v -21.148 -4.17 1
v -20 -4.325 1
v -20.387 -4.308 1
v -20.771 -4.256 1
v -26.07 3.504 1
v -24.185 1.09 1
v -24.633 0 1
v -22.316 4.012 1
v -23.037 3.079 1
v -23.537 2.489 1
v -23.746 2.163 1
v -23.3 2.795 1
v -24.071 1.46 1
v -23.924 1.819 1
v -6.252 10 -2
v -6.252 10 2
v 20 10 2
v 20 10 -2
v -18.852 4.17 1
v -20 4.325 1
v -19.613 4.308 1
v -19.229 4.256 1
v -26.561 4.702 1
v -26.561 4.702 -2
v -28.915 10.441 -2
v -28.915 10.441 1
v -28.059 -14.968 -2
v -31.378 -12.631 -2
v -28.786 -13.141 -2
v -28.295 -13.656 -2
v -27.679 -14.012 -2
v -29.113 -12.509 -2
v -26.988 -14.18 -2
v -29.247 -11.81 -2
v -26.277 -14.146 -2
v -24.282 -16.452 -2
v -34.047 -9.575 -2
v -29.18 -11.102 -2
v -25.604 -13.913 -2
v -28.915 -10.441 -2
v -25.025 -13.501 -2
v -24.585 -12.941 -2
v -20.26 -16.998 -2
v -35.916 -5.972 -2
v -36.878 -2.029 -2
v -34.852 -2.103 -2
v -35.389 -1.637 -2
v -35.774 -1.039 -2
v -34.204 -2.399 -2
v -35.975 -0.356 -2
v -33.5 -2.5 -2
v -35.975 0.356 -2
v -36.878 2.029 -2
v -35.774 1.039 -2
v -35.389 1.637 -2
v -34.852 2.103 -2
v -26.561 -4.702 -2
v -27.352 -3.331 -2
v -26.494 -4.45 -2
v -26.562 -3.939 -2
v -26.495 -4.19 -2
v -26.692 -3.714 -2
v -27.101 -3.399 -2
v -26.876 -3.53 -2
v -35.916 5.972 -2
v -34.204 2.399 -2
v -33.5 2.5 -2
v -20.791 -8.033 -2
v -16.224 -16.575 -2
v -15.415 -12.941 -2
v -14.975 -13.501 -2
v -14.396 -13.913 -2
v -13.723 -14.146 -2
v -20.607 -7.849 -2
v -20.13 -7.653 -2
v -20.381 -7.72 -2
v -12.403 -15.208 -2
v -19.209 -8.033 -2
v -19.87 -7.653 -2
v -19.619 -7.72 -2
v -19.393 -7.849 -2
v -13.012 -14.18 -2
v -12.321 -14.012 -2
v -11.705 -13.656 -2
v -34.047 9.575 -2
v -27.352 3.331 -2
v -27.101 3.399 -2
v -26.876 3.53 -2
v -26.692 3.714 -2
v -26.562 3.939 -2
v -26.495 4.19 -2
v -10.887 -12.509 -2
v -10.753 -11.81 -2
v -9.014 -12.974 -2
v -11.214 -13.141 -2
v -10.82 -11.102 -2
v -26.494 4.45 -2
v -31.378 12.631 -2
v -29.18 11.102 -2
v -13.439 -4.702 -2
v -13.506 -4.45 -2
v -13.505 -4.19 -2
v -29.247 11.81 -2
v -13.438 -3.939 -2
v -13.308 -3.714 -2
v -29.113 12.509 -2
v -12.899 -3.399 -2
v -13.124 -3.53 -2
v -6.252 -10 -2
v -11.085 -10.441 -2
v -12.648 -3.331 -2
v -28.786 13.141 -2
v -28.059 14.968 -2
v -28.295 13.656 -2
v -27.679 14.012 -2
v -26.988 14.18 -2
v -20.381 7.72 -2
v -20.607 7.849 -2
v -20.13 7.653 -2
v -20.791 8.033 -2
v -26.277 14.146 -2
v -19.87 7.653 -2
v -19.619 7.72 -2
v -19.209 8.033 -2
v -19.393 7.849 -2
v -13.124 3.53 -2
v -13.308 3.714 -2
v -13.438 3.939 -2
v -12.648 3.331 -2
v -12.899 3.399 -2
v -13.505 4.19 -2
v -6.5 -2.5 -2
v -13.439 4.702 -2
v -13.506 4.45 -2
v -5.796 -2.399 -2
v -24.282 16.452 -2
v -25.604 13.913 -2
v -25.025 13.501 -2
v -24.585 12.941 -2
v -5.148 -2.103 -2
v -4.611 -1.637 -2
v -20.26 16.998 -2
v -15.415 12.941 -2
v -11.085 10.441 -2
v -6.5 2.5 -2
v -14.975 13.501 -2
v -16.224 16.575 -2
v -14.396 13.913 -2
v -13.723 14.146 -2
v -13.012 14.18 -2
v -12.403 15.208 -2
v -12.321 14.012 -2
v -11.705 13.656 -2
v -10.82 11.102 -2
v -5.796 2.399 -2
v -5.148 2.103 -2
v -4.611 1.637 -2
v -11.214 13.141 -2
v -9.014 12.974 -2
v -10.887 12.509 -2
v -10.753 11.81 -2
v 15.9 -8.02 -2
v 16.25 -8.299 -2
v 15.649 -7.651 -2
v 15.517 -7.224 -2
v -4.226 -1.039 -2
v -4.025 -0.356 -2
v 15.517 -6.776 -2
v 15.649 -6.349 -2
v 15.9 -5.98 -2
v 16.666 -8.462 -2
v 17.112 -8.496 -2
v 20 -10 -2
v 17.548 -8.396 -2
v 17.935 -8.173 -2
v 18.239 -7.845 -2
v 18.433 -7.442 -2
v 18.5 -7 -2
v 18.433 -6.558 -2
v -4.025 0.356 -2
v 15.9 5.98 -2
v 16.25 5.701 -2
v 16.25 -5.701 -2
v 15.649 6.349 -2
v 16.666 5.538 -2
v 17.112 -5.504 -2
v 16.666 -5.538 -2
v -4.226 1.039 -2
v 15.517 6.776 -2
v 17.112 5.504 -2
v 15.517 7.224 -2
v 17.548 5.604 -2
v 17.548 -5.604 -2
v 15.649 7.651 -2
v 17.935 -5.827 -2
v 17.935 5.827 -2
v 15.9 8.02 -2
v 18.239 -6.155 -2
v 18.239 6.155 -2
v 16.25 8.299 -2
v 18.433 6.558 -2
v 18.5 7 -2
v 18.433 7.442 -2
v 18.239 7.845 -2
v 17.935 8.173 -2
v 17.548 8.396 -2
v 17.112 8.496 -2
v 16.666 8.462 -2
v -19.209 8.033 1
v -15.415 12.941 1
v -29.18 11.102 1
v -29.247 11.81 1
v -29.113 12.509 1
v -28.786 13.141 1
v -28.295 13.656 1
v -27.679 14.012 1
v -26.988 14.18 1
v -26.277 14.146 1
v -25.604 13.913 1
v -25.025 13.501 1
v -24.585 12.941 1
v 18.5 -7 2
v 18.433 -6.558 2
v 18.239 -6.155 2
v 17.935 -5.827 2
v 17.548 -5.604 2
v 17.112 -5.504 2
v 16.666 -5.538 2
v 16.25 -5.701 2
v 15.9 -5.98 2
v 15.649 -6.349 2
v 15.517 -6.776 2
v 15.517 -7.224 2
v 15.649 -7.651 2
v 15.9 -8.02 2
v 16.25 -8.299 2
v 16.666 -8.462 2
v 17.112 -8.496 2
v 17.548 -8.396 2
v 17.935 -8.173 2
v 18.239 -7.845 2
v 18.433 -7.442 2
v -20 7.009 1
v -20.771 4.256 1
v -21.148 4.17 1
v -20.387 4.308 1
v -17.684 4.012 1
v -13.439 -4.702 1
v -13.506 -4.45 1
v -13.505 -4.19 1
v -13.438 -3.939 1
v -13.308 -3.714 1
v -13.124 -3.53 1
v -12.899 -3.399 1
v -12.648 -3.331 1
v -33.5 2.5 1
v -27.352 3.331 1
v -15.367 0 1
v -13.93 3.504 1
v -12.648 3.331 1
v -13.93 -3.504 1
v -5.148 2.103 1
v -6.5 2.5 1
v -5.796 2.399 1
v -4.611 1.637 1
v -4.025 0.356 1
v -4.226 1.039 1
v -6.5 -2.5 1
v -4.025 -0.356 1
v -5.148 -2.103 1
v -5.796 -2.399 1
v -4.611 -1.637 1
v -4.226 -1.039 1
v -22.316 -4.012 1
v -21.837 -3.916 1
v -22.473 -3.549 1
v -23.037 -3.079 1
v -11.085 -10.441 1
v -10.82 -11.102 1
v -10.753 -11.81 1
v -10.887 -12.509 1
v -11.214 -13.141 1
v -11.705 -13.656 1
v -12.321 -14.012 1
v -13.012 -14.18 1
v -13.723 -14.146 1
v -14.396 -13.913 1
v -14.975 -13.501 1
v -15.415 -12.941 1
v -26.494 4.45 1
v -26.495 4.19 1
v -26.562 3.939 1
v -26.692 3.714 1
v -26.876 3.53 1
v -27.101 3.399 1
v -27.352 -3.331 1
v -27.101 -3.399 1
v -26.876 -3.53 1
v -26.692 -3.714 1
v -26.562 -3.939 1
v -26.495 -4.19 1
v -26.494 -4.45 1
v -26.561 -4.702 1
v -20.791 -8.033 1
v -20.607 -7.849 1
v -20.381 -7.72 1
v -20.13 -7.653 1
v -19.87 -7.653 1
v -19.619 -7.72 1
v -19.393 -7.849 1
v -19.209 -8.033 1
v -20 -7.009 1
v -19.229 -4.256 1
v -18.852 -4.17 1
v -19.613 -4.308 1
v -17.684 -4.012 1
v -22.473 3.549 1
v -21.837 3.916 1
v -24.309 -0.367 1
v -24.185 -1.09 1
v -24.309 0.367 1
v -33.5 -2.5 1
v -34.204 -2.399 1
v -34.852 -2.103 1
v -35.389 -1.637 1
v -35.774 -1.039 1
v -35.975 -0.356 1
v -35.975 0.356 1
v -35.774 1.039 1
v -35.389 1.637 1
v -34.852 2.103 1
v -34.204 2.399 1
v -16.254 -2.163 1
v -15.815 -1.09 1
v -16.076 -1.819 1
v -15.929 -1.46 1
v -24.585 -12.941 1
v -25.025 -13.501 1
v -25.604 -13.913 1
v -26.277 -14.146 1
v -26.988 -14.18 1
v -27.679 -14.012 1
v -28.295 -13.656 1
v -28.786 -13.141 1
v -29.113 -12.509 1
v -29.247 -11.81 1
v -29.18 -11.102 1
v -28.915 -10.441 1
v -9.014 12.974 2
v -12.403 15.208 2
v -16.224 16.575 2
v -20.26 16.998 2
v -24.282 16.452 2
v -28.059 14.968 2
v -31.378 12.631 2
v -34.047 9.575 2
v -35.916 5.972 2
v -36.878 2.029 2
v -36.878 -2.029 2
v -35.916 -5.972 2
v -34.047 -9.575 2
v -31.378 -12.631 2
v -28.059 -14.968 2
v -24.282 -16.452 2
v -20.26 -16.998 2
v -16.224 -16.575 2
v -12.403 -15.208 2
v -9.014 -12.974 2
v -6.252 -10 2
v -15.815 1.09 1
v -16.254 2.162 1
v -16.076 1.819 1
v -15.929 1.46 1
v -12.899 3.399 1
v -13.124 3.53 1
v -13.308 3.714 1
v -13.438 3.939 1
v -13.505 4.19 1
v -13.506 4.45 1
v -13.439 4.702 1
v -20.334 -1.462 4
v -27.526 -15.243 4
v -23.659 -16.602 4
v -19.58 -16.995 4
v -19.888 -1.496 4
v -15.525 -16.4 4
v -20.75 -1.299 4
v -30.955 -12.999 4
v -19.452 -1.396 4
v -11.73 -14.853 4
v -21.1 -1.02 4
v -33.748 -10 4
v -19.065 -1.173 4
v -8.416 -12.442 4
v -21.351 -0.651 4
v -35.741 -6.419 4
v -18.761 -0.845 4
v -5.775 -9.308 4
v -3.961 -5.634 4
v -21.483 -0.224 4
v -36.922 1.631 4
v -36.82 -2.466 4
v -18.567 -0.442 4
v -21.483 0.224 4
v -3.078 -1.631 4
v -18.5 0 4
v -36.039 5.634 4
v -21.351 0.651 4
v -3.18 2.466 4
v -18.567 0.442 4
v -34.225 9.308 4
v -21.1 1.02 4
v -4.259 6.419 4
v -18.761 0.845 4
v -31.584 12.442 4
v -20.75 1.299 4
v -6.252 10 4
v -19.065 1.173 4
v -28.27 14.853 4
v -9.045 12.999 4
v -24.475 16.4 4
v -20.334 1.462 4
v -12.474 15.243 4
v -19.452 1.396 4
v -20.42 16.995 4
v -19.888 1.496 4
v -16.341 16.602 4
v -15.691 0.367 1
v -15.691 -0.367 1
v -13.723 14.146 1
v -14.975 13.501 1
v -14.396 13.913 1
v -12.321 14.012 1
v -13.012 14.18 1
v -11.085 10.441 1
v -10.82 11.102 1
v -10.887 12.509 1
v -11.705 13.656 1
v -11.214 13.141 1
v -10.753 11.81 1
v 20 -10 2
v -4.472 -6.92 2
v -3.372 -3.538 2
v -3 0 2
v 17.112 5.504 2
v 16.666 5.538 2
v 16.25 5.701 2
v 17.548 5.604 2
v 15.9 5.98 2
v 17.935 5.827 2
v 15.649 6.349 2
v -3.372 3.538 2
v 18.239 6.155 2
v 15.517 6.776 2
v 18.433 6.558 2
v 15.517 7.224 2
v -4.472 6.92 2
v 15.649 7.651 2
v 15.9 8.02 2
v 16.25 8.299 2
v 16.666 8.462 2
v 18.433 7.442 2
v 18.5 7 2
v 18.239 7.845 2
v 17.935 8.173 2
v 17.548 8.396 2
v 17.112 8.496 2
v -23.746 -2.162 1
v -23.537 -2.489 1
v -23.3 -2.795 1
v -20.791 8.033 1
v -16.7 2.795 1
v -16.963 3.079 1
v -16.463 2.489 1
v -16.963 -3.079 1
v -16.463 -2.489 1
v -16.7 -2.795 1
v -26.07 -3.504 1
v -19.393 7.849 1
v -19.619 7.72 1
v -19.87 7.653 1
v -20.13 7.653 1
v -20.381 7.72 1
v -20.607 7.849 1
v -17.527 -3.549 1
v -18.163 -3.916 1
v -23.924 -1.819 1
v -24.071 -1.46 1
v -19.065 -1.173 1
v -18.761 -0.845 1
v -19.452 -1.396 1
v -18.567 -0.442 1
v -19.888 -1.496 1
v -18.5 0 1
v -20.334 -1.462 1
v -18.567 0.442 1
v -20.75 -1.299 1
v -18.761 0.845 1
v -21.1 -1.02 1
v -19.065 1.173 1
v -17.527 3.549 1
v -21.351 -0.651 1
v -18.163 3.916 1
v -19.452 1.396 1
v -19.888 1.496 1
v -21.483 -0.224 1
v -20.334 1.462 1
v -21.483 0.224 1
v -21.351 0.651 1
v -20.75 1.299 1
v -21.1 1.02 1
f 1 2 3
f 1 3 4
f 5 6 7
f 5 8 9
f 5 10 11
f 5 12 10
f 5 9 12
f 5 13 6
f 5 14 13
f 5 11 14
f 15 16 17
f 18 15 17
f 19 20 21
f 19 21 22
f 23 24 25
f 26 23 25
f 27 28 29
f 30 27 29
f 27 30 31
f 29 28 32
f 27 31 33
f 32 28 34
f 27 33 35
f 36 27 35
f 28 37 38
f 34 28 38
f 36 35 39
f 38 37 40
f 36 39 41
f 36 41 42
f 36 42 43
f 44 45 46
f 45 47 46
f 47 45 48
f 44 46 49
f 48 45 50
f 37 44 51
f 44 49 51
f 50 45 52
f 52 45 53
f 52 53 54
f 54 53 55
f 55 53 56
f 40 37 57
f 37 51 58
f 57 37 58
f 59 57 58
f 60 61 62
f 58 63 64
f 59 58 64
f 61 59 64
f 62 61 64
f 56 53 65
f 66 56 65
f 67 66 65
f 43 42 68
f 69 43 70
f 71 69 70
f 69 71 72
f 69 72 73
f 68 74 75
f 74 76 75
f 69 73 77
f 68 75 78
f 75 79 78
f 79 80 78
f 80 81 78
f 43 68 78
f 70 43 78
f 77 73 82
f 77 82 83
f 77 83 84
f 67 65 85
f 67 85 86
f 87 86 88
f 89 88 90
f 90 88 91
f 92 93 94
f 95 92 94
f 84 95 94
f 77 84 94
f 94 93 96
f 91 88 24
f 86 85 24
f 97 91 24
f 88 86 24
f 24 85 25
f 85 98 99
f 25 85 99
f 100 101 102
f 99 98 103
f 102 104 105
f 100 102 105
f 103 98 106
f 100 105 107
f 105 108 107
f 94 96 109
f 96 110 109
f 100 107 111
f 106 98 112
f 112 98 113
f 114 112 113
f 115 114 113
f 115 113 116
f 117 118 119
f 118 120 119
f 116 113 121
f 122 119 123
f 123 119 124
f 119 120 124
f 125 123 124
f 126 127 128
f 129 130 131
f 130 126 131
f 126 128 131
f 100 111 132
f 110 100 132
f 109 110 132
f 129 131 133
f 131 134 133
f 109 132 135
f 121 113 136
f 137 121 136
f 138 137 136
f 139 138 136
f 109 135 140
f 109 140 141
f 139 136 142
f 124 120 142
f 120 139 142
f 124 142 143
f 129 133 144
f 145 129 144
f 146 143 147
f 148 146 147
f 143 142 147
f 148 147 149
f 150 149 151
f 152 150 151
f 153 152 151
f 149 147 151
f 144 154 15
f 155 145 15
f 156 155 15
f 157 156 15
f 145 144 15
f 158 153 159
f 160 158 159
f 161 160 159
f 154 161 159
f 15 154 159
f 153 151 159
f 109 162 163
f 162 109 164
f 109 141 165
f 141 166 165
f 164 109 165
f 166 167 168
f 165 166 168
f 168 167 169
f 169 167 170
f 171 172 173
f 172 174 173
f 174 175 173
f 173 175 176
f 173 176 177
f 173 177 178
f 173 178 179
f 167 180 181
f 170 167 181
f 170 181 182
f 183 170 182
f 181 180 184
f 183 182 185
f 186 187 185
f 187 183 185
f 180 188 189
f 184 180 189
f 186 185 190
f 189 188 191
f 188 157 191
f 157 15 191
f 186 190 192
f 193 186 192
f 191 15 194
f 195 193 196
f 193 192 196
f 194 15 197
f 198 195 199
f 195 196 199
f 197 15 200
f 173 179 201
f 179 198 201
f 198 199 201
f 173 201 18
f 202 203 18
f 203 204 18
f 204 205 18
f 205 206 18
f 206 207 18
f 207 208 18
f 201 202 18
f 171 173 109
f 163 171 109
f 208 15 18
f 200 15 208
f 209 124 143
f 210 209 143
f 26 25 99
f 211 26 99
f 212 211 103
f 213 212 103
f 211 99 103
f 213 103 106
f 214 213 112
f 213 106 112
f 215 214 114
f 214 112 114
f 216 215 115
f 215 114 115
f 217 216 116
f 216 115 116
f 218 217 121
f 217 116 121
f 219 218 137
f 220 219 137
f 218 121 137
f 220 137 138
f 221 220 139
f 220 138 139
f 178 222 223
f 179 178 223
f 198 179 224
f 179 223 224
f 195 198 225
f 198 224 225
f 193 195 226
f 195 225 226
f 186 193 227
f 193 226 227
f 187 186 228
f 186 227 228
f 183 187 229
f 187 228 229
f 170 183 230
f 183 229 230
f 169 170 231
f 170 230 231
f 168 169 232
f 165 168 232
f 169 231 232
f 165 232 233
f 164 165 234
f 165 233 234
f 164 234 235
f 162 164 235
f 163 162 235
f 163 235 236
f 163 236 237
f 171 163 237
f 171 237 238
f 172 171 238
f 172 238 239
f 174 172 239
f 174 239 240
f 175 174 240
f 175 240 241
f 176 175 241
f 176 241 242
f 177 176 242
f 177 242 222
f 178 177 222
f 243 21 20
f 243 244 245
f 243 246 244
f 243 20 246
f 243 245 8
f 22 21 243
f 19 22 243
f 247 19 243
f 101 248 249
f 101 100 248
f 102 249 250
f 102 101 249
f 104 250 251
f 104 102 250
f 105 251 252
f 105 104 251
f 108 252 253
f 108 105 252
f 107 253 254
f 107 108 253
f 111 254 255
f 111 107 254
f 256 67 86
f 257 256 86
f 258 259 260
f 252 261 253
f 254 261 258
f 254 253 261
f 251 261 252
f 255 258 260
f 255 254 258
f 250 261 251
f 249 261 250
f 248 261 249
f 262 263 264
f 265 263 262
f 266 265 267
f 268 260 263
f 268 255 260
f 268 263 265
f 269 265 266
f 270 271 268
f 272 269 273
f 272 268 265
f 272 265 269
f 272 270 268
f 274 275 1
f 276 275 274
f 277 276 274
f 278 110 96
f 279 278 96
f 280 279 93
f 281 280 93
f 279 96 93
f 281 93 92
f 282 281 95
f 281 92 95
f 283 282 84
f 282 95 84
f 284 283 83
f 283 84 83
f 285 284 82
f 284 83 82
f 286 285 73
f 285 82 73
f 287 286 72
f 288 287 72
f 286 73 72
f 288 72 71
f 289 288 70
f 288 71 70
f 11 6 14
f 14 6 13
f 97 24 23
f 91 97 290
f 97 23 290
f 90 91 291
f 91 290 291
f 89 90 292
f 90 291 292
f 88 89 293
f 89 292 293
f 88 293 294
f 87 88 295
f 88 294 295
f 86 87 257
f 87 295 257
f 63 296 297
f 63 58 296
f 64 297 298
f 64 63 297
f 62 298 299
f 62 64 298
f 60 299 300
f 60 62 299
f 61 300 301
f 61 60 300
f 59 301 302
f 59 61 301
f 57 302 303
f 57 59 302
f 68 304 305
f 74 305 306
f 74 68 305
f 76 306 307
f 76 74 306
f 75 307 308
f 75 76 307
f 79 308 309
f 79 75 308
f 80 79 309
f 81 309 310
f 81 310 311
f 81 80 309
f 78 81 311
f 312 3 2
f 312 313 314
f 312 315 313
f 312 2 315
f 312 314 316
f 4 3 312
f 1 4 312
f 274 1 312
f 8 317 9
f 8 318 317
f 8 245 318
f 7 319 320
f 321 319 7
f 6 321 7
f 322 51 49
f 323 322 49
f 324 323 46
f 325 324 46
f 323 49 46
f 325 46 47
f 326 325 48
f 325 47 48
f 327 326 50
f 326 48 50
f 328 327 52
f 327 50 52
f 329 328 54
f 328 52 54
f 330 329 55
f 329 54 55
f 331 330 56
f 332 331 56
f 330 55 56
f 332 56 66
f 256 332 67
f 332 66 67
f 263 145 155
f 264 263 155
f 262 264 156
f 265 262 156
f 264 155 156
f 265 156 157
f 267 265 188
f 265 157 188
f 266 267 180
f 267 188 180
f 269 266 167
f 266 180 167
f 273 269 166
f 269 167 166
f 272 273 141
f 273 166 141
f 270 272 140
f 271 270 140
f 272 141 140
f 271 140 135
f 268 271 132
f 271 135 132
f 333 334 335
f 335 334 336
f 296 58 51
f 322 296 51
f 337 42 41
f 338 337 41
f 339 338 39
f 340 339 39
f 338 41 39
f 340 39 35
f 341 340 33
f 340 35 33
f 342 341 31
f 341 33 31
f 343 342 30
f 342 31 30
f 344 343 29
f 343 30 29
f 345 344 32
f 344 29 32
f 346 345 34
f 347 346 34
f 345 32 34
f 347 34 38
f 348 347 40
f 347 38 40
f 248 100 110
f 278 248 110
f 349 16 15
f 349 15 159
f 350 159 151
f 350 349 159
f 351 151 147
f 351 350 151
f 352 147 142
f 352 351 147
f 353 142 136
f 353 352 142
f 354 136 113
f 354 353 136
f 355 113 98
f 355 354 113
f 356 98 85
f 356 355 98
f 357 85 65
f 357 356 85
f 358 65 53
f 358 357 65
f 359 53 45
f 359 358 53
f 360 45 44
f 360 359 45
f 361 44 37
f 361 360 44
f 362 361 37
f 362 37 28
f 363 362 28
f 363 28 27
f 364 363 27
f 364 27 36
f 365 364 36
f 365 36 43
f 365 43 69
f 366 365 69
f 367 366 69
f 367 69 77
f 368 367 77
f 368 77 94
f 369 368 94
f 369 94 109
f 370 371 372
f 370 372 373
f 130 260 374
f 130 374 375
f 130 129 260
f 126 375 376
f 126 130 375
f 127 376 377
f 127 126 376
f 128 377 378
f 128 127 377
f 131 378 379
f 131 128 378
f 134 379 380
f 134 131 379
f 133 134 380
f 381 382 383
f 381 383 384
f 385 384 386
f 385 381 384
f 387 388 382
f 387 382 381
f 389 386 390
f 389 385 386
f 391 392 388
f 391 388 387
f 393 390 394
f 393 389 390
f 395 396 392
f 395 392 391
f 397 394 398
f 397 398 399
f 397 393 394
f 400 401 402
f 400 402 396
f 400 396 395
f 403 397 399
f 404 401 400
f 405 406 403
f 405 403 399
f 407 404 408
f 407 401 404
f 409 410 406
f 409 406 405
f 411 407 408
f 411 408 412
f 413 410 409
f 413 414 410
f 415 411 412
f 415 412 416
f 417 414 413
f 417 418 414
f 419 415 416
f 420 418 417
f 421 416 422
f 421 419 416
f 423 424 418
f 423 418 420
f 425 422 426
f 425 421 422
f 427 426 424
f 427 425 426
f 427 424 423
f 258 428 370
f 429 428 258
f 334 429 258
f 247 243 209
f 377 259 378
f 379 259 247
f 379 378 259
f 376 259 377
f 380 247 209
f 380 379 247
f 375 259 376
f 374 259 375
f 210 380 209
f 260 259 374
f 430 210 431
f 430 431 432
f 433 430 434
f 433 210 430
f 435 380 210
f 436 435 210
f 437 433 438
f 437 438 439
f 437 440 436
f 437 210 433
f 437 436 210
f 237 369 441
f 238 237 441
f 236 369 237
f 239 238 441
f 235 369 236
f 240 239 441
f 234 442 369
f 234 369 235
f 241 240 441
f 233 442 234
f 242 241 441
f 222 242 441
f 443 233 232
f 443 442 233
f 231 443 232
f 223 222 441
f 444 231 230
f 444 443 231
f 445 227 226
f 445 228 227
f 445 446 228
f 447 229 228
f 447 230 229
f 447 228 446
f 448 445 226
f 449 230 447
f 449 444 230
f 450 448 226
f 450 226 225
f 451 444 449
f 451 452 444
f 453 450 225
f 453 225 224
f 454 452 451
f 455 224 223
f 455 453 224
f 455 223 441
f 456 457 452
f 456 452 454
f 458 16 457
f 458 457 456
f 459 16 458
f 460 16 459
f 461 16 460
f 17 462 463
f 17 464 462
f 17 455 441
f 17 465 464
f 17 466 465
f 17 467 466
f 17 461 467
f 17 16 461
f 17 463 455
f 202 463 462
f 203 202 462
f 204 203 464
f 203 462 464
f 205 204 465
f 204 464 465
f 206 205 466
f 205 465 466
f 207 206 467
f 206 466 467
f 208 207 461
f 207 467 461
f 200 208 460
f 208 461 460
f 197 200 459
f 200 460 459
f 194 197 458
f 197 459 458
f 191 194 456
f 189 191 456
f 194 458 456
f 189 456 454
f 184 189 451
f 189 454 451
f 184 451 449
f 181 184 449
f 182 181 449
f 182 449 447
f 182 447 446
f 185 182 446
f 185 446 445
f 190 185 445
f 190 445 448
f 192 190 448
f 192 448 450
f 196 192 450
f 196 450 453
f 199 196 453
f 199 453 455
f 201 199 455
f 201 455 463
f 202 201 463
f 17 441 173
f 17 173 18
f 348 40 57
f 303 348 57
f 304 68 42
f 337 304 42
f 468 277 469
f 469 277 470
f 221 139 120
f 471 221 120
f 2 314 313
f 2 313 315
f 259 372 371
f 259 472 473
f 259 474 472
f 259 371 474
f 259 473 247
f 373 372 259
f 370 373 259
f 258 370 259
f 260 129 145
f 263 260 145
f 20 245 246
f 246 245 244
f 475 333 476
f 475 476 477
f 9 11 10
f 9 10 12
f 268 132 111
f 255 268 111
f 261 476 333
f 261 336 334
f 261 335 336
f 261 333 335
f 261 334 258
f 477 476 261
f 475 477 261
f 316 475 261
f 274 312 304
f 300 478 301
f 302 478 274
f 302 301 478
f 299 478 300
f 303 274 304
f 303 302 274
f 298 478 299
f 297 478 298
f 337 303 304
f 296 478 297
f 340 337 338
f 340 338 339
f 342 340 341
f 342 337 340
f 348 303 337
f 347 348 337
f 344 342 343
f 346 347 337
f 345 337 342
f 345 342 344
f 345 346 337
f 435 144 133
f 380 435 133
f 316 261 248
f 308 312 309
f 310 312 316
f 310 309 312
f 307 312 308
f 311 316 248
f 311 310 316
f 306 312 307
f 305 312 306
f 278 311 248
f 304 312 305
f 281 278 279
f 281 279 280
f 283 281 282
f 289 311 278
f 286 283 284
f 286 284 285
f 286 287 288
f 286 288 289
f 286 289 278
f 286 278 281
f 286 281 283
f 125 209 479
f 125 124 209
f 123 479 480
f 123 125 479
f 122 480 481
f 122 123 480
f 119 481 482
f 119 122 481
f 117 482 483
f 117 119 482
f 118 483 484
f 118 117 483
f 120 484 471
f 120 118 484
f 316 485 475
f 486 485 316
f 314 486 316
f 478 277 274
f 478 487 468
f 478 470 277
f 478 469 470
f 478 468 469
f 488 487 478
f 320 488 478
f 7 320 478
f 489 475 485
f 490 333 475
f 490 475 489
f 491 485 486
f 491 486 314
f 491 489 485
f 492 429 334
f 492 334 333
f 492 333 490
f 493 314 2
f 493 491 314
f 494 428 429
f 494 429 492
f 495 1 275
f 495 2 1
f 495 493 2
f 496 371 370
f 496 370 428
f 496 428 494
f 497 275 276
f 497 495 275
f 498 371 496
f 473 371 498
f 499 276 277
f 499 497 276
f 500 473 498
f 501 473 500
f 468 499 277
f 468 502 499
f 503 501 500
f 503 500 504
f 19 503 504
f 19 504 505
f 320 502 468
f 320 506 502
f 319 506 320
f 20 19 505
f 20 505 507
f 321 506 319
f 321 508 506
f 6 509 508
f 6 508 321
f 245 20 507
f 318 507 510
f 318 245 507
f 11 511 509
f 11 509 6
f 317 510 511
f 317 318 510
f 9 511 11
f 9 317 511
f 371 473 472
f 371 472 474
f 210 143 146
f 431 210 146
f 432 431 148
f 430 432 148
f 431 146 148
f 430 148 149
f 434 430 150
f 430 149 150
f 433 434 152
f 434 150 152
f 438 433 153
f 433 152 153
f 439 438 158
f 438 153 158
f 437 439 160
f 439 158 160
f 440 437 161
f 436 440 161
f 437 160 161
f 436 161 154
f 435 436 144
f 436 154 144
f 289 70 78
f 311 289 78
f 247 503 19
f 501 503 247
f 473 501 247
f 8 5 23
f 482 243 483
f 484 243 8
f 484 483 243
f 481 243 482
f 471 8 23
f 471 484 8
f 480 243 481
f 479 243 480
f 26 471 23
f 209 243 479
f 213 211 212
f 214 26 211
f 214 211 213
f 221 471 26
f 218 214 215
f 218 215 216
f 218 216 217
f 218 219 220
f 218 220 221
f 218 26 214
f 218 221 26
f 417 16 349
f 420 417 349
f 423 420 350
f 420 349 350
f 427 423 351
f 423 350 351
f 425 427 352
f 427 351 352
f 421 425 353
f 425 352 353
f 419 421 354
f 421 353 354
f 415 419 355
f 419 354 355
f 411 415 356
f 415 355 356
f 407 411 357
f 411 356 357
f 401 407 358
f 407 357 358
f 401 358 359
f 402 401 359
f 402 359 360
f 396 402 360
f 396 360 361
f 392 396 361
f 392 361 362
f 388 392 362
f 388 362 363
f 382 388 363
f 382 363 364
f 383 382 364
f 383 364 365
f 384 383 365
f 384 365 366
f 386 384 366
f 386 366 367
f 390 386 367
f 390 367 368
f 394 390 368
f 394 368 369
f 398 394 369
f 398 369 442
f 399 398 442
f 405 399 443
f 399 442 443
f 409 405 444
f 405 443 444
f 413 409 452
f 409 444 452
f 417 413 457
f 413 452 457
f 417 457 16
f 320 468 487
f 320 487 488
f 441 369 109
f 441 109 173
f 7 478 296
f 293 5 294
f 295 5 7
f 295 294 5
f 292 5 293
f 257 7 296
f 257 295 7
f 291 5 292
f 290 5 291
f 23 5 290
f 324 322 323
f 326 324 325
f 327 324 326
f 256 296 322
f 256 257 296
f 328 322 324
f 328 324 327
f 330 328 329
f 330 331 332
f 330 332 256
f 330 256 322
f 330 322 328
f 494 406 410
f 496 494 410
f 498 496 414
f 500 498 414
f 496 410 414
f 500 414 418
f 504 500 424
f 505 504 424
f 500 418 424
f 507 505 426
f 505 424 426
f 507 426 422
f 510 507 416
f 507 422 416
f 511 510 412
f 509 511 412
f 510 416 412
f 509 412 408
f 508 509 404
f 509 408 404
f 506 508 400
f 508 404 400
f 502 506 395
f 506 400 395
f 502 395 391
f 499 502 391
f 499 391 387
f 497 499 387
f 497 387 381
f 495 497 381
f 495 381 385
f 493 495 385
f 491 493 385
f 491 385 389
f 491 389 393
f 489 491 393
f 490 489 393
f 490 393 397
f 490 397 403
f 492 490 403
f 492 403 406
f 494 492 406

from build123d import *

# Parameters (mm, degrees)
SKETCH1_W                       = 40
SKETCH1_H                       = 20
BOSS_EXTRUDE1_DEPTH             = 2
BOSS_EXTRUDE2_REACH             = 24.716
SKETCH6_R                       = 17
BOSS_EXTRUDE2_DIRECTION_2_DEPTH = 2
SKETCH7_R                       = 2.5
CUT_EXTRUDE3_DEPTH              = 3
CIRPATTERN1_COUNT               = 6
FILLET3_R                       = 1
CUT_EXTRUDE4_REACH              = 43.158
SKETCH8_R                       = 1.5
CUT_EXTRUDE5_REACH              = 42.915
SKETCH9_R                       = 1.5


with BuildPart() as part:
    # Sketch1 → Boss-Extrude1 (new, symmetric)
    with BuildSketch(Plane.XY):
        Rectangle(SKETCH1_W, SKETCH1_H)
    extrude(amount=BOSS_EXTRUDE1_DEPTH, both=True)

    # Boss-Extrude2: up to this face of the body (flat: up to its plane)
    boss_extrude2_end = Plane(part.part.faces().sort_by_distance((0, 0, -2))[0])
    # Sketch6 → Boss-Extrude2 (add, up to the picked face)
    with BuildSketch(Plane.XY.offset(2), mode=Mode.PRIVATE) as boss_extrude2_sk1:
        with Locations(Location((-20, 0, 0), (0, 0, 36.031879072))):
            Circle(SKETCH6_R)
    boss_extrude2_tool1 = split(extrude(boss_extrude2_sk1.sketch, amount=-BOSS_EXTRUDE2_REACH, mode=Mode.PRIVATE), bisect_by=boss_extrude2_end, keep=Keep.BOTH, mode=Mode.PRIVATE)
    add(boss_extrude2_tool1.solids().sort_by(Axis((-20, 0, 2), (0, 0, -1)))[0])

    # Sketch6 → Boss-Extrude2 direction 2 (add)
    with BuildSketch(Plane.XY.offset(2)):
        with Locations(Location((-20, 0, 0), (0, 0, 36.031879072))):
            Circle(SKETCH6_R)
    extrude(amount=BOSS_EXTRUDE2_DIRECTION_2_DEPTH)

    # Sketch7 → Cut-Extrude3 (cut)
    with BuildSketch(Plane(origin=(0, 0, -2), x_dir=(-1, 0, 0), z_dir=(0, 0, -1))):
        with BuildLine():
            Line((21.148365434, 4.169758006), (20, 4.325))
            ThreePointArc((20, 4.325), (15.675, 0), (20, -4.325))
            Line((20, -4.325), (21.148365434, -4.169758006))
            ThreePointArc((21.148365434, -4.169758006), (23.440371019, -2.620967808), (24.325, 0))
            ThreePointArc((24.325, 0), (23.440371019, 2.620967808), (21.148365434, 4.169758006))
        make_face()
        with BuildLine():
            Line((33.5, 2.5), (21.148365434, 4.169758006))
            ThreePointArc((21.148365434, 4.169758006), (23.440371019, 2.620967808), (24.325, 0))
            ThreePointArc((24.325, 0), (23.440371019, -2.620967808), (21.148365434, -4.169758006))
            Line((21.148365434, -4.169758006), (33.5, -2.5))
            ThreePointArc((33.5, -2.5), (31, 0), (33.5, 2.5))
        make_face()
        with Locations((33.5, 0)):
            Circle(SKETCH7_R)
    cut_extrude3 = extrude(amount=-CUT_EXTRUDE3_DEPTH, mode=Mode.SUBTRACT)

    # CirPattern1: Cut-Extrude3 ×6 about axis
    cirpattern1_axis = Axis((-20, 0, 0), (0, 0, 1))
    for i in range(1, CIRPATTERN1_COUNT):
        add(cut_extrude3.rotate(cirpattern1_axis, i * 360 / CIRPATTERN1_COUNT), mode=Mode.SUBTRACT)

    # Fillet3
    fillet3_edges = [part.edges().sort_by_distance(p)[0] for p in [
        (-26.069873399, 3.504443041, -0.5),
        (-20, 7.008886081, -0.5),
        (-13.930126601, 3.504443041, -0.5),
        (-13.930126601, -3.504443041, -0.5),
        (-20, -7.008886081, -0.5),
        (-26.069873399, -3.504443041, -0.5),
    ]]
    fillet(fillet3_edges, radius=FILLET3_R)

    # Sketch8 → Cut-Extrude4 (cut, up to next)
    with BuildSketch(Plane.XY.offset(4), mode=Mode.PRIVATE) as cut_extrude4_sk1:
        with Locations((-20, 0)):
            Circle(SKETCH8_R)
    cut_extrude4_tool1 = extrude(cut_extrude4_sk1.sketch, amount=-CUT_EXTRUDE4_REACH, mode=Mode.PRIVATE) & part.part
    add(cut_extrude4_tool1.solids().sort_by_distance((-20, 0, 4))[0], mode=Mode.SUBTRACT)

    # Sketch9 → Cut-Extrude5 (cut, up to next)
    with BuildSketch(Plane.XY.offset(2), mode=Mode.PRIVATE) as cut_extrude5_sk1:
        with Locations((17, 7)):
            Circle(SKETCH9_R)
    cut_extrude5_tool1 = extrude(cut_extrude5_sk1.sketch, amount=-CUT_EXTRUDE5_REACH, mode=Mode.PRIVATE) & part.part
    # Sketch9 → Cut-Extrude5 (cut, up to next)
    with BuildSketch(Plane.XY.offset(2), mode=Mode.PRIVATE) as cut_extrude5_sk2:
        with Locations((17, -7)):
            Circle(SKETCH9_R)
    cut_extrude5_tool2 = extrude(cut_extrude5_sk2.sketch, amount=-CUT_EXTRUDE5_REACH, mode=Mode.PRIVATE) & part.part
    add(cut_extrude5_tool1.solids().sort_by_distance((17, 7, 2))[0], mode=Mode.SUBTRACT)
    add(cut_extrude5_tool2.solids().sort_by_distance((17, -7, 2))[0], mode=Mode.SUBTRACT)


solid = part.part
